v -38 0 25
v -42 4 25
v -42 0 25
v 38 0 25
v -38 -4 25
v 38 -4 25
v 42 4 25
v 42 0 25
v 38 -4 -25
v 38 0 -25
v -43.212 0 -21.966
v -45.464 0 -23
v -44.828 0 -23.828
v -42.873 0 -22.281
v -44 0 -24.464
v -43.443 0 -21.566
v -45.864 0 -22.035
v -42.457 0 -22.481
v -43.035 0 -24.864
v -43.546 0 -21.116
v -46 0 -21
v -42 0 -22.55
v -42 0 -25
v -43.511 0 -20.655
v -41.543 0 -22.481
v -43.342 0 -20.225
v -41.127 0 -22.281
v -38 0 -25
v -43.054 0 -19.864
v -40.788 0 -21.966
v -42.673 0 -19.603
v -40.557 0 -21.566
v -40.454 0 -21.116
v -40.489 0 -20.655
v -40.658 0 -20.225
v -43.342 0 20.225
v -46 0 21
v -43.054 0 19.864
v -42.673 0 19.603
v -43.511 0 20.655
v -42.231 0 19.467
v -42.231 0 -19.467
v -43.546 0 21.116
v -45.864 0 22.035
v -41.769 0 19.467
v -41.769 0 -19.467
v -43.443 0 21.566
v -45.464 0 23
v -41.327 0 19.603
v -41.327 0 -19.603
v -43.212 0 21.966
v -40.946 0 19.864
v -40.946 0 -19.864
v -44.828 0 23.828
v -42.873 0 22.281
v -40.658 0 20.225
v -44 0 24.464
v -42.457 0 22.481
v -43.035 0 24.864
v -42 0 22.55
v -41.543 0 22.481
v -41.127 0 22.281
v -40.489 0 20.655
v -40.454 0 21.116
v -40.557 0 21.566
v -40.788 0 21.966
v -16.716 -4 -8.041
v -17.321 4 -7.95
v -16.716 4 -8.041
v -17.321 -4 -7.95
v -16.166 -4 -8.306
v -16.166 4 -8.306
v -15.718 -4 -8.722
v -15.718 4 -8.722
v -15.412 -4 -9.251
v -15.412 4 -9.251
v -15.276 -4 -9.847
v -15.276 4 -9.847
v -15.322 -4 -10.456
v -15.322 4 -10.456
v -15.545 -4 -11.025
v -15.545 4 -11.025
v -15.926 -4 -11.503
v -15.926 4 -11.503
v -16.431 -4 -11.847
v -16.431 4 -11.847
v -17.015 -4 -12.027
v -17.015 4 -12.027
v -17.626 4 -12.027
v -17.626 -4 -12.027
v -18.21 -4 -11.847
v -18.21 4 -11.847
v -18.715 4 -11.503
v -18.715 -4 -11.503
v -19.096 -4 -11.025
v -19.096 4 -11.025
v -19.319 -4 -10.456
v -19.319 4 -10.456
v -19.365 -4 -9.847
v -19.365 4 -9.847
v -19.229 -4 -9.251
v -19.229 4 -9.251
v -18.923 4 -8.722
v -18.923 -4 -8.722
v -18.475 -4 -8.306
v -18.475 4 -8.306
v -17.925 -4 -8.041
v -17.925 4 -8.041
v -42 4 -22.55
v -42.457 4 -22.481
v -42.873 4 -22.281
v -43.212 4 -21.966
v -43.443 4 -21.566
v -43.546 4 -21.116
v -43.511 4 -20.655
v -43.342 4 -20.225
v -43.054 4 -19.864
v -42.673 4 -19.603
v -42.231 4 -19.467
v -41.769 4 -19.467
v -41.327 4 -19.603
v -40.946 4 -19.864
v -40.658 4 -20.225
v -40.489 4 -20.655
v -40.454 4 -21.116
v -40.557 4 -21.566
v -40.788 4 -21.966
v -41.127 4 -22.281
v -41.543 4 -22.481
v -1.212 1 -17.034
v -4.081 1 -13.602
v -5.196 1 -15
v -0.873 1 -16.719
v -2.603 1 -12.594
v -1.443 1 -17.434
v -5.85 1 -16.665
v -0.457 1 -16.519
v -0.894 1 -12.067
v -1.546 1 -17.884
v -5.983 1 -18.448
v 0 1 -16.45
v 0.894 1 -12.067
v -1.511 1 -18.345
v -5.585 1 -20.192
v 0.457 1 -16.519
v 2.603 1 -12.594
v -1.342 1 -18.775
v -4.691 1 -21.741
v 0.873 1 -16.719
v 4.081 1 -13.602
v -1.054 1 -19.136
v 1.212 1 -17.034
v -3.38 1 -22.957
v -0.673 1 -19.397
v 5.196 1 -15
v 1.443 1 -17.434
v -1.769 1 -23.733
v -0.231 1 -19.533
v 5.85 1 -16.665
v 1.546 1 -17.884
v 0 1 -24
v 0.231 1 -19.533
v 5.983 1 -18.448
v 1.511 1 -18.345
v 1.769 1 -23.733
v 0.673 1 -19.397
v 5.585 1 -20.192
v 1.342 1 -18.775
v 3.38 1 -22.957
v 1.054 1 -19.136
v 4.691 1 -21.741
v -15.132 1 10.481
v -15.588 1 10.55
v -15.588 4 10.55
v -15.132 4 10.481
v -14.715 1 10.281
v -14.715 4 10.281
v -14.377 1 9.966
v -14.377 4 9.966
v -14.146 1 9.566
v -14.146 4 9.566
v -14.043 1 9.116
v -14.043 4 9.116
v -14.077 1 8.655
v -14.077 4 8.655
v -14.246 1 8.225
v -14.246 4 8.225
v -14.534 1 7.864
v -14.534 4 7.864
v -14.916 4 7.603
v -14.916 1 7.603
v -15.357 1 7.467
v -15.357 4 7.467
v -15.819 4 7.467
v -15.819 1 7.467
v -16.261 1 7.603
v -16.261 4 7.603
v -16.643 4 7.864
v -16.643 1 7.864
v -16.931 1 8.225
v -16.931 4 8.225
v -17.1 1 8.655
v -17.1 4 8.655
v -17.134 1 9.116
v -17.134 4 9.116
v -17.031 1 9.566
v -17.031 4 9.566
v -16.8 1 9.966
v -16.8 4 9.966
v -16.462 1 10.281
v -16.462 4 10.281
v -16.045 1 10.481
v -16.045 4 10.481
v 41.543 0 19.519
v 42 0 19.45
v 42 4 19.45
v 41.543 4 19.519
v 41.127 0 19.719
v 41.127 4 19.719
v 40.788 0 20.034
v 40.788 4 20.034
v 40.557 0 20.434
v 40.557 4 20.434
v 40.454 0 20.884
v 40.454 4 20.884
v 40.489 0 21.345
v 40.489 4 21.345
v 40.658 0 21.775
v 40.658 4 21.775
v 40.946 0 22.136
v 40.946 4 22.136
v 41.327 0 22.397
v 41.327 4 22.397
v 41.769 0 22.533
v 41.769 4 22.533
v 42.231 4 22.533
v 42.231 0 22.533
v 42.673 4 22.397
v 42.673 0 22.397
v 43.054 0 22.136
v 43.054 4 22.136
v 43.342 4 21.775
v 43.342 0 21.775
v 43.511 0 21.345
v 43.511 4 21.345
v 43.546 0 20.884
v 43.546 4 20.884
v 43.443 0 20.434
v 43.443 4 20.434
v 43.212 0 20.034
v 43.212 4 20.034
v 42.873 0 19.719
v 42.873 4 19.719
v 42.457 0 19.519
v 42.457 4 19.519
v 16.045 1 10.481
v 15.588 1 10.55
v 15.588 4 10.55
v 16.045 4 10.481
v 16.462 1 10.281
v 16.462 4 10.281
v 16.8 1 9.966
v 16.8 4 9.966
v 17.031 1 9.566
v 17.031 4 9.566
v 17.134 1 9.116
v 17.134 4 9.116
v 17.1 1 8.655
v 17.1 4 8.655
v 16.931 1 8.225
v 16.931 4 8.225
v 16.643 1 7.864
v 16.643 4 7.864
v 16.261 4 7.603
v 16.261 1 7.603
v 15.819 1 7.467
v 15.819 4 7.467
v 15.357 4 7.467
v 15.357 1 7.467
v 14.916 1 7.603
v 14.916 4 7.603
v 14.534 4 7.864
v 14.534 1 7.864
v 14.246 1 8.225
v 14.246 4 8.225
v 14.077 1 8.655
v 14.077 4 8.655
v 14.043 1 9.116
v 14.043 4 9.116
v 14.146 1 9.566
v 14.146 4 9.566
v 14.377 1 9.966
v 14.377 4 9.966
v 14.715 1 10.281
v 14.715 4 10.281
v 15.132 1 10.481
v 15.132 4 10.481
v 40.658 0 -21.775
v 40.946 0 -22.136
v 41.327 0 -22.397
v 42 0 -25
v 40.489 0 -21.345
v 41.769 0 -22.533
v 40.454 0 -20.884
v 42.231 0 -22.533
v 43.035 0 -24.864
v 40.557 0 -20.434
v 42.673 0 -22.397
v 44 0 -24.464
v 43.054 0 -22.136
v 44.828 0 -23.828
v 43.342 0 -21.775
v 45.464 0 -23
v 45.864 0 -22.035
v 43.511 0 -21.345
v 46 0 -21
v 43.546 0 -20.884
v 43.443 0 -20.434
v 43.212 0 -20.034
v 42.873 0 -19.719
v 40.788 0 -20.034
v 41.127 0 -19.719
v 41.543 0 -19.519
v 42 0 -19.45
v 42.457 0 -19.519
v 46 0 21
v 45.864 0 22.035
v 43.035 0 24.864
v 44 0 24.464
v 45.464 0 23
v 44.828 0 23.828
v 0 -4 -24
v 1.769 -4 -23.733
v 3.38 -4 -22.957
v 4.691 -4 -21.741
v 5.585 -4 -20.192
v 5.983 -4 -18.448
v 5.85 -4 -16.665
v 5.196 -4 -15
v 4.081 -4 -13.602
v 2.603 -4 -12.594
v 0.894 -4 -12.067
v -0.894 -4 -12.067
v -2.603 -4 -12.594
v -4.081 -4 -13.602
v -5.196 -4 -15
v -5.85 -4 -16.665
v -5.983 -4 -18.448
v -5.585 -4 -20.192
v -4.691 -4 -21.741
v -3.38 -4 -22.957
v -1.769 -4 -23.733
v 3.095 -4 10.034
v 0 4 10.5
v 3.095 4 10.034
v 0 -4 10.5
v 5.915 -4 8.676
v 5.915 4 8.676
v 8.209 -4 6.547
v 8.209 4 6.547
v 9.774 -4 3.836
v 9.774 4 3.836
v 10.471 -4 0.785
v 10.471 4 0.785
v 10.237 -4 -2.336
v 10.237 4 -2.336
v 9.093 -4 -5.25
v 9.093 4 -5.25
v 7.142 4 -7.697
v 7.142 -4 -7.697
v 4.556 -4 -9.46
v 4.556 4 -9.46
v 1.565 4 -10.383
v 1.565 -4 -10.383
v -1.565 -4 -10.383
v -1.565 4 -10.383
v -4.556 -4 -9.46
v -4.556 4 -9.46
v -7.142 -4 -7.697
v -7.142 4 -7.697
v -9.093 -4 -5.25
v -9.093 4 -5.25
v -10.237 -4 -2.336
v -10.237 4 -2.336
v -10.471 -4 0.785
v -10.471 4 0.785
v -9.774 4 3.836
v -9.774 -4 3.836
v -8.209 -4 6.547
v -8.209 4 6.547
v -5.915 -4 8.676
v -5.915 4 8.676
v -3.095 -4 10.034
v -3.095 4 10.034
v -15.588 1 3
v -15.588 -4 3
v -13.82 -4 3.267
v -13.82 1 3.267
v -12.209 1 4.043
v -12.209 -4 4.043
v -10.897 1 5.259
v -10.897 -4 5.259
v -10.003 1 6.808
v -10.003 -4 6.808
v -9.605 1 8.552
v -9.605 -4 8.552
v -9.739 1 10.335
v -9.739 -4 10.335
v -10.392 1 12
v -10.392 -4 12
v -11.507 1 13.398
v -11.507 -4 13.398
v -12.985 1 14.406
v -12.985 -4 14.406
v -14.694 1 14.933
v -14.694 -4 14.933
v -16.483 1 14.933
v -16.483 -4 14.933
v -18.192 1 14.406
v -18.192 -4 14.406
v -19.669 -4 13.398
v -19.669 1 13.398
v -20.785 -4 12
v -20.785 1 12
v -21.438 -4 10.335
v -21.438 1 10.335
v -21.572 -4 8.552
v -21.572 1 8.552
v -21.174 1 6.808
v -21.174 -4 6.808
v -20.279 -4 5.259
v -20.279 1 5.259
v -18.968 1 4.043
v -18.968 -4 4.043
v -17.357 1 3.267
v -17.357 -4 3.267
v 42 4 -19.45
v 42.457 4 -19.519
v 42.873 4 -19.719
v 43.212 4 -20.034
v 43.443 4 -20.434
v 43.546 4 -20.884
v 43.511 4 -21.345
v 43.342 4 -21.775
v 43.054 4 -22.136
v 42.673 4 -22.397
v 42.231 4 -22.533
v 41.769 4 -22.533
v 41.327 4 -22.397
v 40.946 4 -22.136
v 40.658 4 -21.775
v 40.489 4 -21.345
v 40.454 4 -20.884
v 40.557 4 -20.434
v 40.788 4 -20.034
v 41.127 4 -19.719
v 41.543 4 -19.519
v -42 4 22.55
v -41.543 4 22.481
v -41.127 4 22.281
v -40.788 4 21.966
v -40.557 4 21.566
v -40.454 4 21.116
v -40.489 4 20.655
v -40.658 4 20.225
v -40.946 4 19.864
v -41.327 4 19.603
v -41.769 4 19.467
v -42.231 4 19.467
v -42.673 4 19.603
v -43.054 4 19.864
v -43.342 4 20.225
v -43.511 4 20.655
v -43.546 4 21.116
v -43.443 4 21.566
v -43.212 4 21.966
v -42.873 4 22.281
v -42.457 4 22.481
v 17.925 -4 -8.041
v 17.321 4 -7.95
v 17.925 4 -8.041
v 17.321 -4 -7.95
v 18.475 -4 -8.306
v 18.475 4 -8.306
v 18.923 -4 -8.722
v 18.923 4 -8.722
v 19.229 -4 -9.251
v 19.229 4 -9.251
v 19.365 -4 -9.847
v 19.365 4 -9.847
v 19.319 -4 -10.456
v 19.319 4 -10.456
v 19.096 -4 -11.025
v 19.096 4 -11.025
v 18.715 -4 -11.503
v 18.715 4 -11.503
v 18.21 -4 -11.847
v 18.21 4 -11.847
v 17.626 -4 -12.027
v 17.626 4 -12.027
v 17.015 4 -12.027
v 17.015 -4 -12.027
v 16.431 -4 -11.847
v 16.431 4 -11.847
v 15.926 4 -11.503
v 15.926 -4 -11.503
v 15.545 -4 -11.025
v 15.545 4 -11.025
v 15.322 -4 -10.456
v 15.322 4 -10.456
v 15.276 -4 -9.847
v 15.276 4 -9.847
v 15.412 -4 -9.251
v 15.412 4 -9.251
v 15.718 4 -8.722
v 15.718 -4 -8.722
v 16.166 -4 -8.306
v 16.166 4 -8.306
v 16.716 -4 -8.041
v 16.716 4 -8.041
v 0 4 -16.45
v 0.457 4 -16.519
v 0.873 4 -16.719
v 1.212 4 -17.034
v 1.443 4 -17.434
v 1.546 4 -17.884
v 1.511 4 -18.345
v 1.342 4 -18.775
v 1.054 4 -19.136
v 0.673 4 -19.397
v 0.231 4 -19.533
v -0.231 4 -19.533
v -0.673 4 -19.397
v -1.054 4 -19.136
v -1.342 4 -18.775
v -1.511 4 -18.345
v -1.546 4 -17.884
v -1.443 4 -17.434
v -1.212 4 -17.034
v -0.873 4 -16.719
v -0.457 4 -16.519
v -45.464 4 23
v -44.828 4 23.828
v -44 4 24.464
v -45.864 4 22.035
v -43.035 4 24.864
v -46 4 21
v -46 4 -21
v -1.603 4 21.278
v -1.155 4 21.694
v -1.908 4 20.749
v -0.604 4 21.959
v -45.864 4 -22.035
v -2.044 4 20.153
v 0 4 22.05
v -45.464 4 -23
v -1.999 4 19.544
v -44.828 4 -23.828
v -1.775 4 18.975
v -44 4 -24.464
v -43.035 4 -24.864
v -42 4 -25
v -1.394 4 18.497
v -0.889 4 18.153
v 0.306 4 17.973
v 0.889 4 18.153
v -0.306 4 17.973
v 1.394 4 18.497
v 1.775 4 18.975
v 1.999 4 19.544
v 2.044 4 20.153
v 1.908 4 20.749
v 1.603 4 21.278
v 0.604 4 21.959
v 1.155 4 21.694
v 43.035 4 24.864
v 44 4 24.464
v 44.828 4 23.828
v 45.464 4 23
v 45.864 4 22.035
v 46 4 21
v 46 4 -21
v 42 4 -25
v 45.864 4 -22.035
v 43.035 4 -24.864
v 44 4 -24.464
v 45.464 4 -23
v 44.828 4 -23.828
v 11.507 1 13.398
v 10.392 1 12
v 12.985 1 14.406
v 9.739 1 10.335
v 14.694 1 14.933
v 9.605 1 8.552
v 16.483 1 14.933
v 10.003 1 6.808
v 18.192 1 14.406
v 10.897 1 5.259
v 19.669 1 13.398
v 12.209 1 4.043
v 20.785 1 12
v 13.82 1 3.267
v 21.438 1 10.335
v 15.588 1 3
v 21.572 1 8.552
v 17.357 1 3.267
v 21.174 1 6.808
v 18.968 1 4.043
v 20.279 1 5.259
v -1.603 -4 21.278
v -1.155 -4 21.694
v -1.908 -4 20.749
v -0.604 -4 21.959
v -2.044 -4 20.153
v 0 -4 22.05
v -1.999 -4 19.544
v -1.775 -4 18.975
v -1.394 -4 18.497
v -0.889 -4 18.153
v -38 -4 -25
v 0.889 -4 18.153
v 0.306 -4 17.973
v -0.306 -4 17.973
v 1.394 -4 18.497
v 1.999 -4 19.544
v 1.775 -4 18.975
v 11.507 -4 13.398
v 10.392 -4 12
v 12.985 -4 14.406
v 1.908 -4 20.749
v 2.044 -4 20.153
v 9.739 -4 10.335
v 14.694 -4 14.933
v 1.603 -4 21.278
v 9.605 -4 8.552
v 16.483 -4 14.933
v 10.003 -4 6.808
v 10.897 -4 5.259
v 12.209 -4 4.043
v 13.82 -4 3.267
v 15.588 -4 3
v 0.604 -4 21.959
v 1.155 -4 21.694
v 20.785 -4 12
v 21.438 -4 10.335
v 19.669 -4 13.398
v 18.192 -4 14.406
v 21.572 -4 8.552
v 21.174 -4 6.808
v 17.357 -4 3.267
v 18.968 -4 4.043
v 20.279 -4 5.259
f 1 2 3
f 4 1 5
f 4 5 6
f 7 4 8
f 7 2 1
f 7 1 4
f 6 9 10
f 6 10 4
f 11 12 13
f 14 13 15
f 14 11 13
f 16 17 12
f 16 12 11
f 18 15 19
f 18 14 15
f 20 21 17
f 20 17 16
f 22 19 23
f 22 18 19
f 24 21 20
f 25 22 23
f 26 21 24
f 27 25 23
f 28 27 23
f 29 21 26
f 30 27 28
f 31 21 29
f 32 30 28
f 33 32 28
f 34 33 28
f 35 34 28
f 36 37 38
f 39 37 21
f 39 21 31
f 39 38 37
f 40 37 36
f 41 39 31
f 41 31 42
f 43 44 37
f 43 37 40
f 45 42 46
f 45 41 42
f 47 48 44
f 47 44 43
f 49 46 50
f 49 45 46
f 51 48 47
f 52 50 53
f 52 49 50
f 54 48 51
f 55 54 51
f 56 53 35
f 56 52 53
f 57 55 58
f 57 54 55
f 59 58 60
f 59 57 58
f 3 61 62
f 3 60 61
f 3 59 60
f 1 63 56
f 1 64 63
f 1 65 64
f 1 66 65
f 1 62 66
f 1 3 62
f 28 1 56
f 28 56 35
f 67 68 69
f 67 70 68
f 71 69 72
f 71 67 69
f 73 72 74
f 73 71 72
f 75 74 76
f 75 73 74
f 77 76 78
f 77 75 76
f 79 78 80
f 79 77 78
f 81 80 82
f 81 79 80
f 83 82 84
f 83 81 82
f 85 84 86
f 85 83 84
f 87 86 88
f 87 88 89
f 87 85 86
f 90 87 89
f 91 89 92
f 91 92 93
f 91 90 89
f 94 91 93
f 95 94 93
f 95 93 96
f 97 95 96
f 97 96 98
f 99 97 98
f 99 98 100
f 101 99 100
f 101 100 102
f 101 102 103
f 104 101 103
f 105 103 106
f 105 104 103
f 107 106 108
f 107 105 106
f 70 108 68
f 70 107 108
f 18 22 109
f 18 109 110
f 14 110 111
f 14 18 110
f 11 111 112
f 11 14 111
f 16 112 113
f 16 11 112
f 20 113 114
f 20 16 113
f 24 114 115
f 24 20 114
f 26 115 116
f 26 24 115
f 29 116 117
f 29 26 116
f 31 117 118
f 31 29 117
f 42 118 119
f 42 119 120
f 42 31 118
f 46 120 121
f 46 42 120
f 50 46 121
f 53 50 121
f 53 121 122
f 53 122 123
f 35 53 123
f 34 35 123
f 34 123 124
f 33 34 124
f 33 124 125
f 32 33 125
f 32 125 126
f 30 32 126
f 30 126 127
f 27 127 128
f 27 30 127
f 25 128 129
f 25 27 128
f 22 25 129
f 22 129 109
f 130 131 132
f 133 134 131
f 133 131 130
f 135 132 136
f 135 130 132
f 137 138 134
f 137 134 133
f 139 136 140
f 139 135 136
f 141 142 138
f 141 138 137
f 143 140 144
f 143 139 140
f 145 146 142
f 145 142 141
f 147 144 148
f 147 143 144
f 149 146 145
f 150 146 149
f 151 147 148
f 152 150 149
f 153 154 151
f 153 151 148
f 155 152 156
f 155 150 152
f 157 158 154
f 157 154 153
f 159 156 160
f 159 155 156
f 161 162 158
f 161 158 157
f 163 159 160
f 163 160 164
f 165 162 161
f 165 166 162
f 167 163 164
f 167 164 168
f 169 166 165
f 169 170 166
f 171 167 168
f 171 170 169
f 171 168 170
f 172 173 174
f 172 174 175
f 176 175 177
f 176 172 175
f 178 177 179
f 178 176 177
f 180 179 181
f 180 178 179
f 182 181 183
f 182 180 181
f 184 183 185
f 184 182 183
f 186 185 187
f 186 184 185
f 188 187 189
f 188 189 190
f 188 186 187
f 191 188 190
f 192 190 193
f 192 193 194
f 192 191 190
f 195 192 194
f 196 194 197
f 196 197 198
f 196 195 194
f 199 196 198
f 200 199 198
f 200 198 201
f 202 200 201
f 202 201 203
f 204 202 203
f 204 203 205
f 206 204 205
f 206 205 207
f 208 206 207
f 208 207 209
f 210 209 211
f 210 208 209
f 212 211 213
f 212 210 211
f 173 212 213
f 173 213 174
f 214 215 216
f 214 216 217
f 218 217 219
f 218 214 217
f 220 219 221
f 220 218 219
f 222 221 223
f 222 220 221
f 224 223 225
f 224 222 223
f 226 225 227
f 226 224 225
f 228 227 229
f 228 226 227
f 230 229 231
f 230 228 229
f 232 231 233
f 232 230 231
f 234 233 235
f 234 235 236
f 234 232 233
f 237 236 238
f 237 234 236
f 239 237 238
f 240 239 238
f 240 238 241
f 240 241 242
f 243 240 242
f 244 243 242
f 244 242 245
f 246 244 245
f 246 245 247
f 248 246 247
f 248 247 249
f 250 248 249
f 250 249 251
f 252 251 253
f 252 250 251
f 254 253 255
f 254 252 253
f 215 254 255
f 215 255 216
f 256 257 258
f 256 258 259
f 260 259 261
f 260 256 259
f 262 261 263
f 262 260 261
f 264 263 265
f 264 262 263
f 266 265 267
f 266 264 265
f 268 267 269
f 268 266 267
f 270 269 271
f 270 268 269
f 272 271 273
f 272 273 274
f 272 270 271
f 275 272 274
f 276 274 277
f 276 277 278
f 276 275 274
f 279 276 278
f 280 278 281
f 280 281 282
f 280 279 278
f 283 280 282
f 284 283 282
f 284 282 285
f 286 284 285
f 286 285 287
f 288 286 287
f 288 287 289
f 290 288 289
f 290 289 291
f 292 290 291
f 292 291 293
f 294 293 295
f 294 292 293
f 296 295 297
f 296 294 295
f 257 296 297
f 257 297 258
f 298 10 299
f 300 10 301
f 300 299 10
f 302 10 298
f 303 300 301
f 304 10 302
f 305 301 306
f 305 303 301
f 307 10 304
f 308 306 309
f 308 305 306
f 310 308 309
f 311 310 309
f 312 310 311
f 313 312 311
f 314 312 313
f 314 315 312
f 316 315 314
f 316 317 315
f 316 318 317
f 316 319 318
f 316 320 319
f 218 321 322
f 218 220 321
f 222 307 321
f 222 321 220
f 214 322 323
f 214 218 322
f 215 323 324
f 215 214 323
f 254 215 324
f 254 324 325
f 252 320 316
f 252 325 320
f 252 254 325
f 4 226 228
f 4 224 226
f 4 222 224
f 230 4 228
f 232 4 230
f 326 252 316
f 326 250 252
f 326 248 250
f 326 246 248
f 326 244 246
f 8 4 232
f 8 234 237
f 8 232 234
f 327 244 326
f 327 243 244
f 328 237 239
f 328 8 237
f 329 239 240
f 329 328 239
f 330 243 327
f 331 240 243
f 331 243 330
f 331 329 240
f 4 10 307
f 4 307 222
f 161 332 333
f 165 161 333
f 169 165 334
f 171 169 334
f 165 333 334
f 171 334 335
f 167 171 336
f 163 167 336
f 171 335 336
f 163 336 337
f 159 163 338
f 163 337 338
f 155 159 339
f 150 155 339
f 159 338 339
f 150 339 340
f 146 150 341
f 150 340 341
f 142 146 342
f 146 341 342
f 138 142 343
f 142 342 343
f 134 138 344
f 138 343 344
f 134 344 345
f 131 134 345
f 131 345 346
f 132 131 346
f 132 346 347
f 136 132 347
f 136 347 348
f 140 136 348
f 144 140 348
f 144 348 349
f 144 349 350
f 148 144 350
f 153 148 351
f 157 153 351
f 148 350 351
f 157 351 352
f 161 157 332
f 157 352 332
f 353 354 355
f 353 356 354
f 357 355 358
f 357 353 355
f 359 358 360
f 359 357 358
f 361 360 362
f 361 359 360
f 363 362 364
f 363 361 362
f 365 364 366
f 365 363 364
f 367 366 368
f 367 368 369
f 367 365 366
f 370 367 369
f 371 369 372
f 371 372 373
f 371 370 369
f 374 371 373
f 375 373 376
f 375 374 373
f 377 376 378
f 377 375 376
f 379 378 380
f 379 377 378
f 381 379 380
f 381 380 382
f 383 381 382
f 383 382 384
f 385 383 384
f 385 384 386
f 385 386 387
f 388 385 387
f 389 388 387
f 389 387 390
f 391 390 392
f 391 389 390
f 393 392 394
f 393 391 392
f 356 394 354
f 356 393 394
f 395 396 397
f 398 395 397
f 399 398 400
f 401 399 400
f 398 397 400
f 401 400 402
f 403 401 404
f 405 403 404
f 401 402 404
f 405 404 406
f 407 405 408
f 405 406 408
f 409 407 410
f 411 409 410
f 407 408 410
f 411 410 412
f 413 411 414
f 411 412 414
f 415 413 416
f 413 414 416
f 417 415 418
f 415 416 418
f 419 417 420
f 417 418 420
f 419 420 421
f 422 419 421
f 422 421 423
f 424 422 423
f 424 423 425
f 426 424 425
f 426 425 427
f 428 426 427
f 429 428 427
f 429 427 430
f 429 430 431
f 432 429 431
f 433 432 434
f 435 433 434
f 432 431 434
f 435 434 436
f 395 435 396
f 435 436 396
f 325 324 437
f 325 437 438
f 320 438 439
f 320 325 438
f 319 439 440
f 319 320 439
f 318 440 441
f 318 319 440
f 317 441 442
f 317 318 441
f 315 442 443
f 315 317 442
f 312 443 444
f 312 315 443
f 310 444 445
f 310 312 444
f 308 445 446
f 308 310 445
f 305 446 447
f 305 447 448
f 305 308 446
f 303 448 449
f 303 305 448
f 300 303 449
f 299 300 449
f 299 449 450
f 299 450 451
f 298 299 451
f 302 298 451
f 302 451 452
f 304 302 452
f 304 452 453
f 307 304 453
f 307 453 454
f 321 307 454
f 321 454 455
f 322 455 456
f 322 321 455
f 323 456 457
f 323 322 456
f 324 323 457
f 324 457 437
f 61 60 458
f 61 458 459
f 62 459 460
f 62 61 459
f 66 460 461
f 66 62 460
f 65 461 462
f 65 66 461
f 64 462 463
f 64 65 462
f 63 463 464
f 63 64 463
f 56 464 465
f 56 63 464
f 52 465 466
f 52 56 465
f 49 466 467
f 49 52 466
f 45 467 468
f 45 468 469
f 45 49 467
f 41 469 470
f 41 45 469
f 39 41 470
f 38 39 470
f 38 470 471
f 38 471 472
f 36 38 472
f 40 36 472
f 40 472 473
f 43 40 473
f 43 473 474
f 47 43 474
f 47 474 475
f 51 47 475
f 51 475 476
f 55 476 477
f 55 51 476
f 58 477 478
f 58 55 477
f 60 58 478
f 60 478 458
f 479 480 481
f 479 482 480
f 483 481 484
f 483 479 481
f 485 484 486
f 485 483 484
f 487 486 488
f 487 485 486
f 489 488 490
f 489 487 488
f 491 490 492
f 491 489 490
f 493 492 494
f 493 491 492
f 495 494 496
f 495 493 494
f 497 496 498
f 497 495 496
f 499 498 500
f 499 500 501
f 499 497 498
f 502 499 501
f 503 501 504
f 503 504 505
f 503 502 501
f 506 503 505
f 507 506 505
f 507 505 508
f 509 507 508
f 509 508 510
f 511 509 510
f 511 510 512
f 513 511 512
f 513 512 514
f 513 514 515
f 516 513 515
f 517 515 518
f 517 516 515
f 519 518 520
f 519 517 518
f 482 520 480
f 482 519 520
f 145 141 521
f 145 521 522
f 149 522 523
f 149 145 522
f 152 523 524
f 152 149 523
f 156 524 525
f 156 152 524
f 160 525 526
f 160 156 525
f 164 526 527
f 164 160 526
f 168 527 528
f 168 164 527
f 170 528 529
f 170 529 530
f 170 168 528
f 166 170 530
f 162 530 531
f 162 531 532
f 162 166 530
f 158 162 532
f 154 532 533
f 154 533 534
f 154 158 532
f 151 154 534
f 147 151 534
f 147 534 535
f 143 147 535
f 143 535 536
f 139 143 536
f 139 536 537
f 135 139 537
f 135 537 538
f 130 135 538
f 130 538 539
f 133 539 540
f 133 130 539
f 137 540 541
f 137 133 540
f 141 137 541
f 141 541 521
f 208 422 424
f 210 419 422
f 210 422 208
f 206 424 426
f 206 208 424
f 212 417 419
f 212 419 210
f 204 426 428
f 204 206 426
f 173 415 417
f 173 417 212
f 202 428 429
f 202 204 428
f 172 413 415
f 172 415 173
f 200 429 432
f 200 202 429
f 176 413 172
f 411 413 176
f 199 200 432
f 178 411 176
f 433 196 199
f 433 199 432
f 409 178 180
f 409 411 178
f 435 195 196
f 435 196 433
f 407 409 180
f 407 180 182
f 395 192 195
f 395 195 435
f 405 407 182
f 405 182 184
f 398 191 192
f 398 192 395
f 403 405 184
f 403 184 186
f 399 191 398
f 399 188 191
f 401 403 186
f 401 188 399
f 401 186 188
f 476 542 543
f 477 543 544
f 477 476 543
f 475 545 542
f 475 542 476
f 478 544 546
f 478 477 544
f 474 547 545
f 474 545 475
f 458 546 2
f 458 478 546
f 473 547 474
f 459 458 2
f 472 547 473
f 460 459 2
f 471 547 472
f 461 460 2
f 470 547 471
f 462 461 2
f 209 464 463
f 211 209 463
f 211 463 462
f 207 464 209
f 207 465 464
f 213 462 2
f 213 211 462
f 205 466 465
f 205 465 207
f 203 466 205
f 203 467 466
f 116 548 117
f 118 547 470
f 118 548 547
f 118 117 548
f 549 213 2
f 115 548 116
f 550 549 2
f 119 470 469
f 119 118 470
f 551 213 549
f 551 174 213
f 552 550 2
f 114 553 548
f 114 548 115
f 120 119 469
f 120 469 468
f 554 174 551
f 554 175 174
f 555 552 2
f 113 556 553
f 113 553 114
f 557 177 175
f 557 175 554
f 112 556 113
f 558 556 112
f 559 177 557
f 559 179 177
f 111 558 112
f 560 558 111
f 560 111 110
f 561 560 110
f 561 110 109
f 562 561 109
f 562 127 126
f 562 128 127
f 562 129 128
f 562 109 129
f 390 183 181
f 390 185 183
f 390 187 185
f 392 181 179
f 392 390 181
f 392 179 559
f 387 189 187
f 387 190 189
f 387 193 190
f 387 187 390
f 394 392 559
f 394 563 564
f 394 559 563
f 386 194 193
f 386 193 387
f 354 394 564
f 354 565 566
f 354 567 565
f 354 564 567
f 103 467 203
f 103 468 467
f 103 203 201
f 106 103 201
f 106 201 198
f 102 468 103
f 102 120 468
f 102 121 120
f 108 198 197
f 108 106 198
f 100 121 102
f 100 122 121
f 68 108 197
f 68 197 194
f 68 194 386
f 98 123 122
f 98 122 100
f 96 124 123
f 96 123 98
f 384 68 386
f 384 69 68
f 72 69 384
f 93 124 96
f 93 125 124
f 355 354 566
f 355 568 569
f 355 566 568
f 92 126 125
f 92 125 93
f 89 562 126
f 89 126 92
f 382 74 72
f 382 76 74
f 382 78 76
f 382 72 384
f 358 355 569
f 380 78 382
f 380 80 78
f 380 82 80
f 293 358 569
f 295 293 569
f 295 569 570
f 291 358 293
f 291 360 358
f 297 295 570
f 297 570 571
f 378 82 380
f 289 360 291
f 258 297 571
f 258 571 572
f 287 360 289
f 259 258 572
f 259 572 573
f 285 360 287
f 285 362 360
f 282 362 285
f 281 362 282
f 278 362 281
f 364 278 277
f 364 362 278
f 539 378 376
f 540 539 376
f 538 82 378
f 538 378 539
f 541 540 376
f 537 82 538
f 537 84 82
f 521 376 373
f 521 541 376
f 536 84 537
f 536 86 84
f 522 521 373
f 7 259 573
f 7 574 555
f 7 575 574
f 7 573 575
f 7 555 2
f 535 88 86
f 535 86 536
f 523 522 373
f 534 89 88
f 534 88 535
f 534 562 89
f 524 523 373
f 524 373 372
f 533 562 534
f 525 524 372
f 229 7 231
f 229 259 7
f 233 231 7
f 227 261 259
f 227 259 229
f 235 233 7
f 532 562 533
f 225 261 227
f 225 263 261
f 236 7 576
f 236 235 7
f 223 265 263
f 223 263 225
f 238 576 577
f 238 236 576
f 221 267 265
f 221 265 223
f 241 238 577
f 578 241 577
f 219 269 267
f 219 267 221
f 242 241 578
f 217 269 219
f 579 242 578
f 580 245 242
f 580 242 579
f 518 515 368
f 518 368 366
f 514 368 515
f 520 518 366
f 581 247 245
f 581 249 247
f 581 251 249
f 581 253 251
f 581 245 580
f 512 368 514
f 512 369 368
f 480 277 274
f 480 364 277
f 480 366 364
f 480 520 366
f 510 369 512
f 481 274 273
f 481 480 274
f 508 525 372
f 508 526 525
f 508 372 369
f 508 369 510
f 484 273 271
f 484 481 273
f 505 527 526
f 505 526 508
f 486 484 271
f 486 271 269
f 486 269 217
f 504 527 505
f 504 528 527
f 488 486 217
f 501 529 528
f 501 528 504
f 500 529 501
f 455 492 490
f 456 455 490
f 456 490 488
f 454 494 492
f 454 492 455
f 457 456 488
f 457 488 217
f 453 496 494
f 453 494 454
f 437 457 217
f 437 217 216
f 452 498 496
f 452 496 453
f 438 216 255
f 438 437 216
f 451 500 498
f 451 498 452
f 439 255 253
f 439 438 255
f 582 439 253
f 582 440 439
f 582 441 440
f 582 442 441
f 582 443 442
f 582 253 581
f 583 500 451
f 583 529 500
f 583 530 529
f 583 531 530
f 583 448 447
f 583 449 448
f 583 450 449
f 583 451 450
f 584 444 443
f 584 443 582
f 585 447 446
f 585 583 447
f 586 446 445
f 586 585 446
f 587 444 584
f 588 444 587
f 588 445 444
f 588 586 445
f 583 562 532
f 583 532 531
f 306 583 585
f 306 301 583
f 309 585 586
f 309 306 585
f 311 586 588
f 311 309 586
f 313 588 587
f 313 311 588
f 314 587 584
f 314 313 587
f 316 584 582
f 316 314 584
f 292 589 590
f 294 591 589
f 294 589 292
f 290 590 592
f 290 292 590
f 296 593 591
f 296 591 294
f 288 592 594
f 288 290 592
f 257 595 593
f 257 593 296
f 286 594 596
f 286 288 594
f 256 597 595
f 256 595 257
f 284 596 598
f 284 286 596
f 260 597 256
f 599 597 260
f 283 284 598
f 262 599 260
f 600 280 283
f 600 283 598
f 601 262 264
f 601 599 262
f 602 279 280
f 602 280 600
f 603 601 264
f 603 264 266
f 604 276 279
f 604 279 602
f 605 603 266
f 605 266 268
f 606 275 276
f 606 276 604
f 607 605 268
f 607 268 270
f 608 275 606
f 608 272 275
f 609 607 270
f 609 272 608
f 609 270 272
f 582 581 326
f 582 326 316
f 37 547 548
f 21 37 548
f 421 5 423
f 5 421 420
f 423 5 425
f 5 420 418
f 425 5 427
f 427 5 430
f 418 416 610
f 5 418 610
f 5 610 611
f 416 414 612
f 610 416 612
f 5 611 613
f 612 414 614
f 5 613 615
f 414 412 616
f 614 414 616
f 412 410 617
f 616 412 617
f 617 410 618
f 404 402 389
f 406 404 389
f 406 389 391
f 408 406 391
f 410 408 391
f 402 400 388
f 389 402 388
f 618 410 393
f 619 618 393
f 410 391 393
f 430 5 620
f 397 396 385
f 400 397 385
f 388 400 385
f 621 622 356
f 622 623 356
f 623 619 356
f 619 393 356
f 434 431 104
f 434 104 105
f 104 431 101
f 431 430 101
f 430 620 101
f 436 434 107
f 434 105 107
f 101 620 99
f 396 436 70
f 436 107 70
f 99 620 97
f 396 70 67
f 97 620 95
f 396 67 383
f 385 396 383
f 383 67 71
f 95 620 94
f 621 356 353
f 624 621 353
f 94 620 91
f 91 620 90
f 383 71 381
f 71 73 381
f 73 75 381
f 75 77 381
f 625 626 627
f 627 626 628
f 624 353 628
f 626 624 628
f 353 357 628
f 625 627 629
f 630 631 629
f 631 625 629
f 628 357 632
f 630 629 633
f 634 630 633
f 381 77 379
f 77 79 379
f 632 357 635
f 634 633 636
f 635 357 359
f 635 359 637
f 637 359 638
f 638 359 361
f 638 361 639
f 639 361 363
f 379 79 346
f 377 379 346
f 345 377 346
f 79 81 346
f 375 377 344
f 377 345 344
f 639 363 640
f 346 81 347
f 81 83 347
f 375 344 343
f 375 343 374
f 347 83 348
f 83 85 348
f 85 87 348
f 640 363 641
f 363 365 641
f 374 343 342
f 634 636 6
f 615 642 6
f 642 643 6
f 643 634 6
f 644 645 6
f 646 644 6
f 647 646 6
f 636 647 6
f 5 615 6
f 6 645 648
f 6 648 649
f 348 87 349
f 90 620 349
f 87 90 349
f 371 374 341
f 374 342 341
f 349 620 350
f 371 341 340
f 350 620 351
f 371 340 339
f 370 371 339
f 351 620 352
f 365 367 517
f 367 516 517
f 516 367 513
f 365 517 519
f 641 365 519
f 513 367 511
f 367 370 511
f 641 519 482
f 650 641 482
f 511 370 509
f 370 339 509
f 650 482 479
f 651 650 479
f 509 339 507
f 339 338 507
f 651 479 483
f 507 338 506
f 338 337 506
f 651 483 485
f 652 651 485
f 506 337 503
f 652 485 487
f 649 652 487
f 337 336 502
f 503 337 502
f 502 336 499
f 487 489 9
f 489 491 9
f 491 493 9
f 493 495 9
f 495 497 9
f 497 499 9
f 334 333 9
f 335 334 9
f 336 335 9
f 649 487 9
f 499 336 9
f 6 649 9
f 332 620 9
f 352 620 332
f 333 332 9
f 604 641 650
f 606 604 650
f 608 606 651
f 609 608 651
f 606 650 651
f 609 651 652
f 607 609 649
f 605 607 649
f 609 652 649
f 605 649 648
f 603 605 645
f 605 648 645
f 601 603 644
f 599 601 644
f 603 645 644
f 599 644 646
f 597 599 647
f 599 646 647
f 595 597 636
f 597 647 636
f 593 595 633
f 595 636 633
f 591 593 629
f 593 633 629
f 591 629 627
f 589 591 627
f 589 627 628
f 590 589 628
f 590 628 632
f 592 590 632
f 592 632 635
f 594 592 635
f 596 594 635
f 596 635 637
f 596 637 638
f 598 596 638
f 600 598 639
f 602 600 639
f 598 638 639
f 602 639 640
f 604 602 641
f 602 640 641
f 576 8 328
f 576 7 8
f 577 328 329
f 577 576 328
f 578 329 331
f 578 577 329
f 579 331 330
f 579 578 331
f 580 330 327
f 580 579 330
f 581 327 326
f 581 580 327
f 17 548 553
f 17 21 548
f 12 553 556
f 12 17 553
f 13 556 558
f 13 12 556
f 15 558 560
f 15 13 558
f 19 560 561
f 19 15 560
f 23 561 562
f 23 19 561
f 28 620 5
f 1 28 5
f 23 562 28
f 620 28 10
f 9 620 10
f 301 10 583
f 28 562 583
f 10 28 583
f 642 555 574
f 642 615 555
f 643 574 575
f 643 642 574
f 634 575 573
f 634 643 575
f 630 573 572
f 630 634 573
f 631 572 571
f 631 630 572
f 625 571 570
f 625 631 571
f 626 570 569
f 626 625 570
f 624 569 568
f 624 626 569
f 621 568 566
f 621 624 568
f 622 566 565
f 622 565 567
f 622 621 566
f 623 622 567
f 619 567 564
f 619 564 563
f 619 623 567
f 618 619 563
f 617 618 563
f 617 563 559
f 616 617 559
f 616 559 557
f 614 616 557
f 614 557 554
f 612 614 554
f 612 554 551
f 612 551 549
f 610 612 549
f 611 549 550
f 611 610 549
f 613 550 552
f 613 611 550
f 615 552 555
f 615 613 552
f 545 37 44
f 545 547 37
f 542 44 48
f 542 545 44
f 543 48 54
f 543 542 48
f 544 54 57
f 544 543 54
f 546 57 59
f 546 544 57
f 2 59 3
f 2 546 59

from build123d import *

# Parameters (mm, degrees)
SKETCH_1_W          = 92
SKETCH_1_H          = 50
SKETCH_1_R          = 1.55
SKETCH_1_R_2        = 10.5
SKETCH_1_R_3        = 2.05
EXTRUDE_1_DEPTH     = 4
SKETCH_13_W         = 8
SKETCH_13_H         = 50
CUT_EXTRUDE_8_DEPTH = 4
FILLET2_R           = 4
SKETCH1_R           = 6
CUT_EXTRUDE1_DEPTH  = 5


with BuildPart() as part:
    # 草图1 → 凸台-拉伸1 (new, symmetric)
    with BuildSketch(Plane(origin=(0, 0, 0), x_dir=(1, 0, 0), z_dir=(0, 1, 0))):
        Rectangle(SKETCH_1_W, SKETCH_1_H)
        with Locations(Location((-42, -21, 0), (0, 0, 270))):
            Circle(SKETCH_1_R, mode=Mode.SUBTRACT)
        with Locations(Location((0, 0, 0), (0, 0, 270))):
            Circle(SKETCH_1_R_2, mode=Mode.SUBTRACT)
        with Locations(Location((0, -20, 0), (0, 0, 270))):
            Circle(SKETCH_1_R_3, mode=Mode.SUBTRACT)
        with Locations(Location((-17.320508076, 10, 0), (0, 0, 270))):
            Circle(SKETCH_1_R_3, mode=Mode.SUBTRACT)
        with Locations(Location((17.320508076, 10, 0), (0, 0, 270))):
            Circle(SKETCH_1_R_3, mode=Mode.SUBTRACT)
        with Locations(Location((42, -21, 0), (0, 0, 90))):
            Circle(SKETCH_1_R, mode=Mode.SUBTRACT)
        with Locations(Location((42, 21, 0), (0, 0, 270))):
            Circle(SKETCH_1_R, mode=Mode.SUBTRACT)
        with Locations(Location((-42, 21, 0), (0, 0, 90))):
            Circle(SKETCH_1_R, mode=Mode.SUBTRACT)
        with Locations(Location((0, 18, 0), (0, 0, 270))):
            Circle(SKETCH_1_R, mode=Mode.SUBTRACT)
        with Locations(Location((15.588457268, -9, 0), (0, 0, 270))):
            Circle(SKETCH_1_R, mode=Mode.SUBTRACT)
        with Locations(Location((-15.588457268, -9, 0), (0, 0, 270))):
            Circle(SKETCH_1_R, mode=Mode.SUBTRACT)
    extrude(amount=EXTRUDE_1_DEPTH, both=True)

    # 草图13 → 切除-拉伸8 (cut)
    with BuildSketch(Plane.XZ.offset(4)):
        with Locations((42, 0)):
            Rectangle(SKETCH_13_W, SKETCH_13_H)
        with Locations((-42, 0)):
            Rectangle(SKETCH_13_W, SKETCH_13_H)
    extrude(amount=-CUT_EXTRUDE_8_DEPTH, mode=Mode.SUBTRACT)

    # Fillet2
    fillet2_edges = [part.edges().sort_by_distance(p)[0] for p in [
        (46, 2, -25),
        (46, 2, 25),
        (-46, 2, -25),
        (-46, 2, 25),
    ]]
    fillet(fillet2_edges, radius=FILLET2_R)

    # Sketch1 → Cut-Extrude1 (cut)
    with BuildSketch(Plane(origin=(0, -4, 0), x_dir=(-1, 0, 0), z_dir=(0, -1, 0))):
        with Locations(Location((0, 18, 0), (0, 0, 90))):
            Circle(SKETCH1_R)
        with Locations(Location((15.588457268, -9, 0), (0, 0, 90))):
            Circle(SKETCH1_R)
        with Locations(Location((-15.588457268, -9, 0), (0, 0, 90))):
            Circle(SKETCH1_R)
    extrude(amount=-CUT_EXTRUDE1_DEPTH, mode=Mode.SUBTRACT)


solid = part.part
